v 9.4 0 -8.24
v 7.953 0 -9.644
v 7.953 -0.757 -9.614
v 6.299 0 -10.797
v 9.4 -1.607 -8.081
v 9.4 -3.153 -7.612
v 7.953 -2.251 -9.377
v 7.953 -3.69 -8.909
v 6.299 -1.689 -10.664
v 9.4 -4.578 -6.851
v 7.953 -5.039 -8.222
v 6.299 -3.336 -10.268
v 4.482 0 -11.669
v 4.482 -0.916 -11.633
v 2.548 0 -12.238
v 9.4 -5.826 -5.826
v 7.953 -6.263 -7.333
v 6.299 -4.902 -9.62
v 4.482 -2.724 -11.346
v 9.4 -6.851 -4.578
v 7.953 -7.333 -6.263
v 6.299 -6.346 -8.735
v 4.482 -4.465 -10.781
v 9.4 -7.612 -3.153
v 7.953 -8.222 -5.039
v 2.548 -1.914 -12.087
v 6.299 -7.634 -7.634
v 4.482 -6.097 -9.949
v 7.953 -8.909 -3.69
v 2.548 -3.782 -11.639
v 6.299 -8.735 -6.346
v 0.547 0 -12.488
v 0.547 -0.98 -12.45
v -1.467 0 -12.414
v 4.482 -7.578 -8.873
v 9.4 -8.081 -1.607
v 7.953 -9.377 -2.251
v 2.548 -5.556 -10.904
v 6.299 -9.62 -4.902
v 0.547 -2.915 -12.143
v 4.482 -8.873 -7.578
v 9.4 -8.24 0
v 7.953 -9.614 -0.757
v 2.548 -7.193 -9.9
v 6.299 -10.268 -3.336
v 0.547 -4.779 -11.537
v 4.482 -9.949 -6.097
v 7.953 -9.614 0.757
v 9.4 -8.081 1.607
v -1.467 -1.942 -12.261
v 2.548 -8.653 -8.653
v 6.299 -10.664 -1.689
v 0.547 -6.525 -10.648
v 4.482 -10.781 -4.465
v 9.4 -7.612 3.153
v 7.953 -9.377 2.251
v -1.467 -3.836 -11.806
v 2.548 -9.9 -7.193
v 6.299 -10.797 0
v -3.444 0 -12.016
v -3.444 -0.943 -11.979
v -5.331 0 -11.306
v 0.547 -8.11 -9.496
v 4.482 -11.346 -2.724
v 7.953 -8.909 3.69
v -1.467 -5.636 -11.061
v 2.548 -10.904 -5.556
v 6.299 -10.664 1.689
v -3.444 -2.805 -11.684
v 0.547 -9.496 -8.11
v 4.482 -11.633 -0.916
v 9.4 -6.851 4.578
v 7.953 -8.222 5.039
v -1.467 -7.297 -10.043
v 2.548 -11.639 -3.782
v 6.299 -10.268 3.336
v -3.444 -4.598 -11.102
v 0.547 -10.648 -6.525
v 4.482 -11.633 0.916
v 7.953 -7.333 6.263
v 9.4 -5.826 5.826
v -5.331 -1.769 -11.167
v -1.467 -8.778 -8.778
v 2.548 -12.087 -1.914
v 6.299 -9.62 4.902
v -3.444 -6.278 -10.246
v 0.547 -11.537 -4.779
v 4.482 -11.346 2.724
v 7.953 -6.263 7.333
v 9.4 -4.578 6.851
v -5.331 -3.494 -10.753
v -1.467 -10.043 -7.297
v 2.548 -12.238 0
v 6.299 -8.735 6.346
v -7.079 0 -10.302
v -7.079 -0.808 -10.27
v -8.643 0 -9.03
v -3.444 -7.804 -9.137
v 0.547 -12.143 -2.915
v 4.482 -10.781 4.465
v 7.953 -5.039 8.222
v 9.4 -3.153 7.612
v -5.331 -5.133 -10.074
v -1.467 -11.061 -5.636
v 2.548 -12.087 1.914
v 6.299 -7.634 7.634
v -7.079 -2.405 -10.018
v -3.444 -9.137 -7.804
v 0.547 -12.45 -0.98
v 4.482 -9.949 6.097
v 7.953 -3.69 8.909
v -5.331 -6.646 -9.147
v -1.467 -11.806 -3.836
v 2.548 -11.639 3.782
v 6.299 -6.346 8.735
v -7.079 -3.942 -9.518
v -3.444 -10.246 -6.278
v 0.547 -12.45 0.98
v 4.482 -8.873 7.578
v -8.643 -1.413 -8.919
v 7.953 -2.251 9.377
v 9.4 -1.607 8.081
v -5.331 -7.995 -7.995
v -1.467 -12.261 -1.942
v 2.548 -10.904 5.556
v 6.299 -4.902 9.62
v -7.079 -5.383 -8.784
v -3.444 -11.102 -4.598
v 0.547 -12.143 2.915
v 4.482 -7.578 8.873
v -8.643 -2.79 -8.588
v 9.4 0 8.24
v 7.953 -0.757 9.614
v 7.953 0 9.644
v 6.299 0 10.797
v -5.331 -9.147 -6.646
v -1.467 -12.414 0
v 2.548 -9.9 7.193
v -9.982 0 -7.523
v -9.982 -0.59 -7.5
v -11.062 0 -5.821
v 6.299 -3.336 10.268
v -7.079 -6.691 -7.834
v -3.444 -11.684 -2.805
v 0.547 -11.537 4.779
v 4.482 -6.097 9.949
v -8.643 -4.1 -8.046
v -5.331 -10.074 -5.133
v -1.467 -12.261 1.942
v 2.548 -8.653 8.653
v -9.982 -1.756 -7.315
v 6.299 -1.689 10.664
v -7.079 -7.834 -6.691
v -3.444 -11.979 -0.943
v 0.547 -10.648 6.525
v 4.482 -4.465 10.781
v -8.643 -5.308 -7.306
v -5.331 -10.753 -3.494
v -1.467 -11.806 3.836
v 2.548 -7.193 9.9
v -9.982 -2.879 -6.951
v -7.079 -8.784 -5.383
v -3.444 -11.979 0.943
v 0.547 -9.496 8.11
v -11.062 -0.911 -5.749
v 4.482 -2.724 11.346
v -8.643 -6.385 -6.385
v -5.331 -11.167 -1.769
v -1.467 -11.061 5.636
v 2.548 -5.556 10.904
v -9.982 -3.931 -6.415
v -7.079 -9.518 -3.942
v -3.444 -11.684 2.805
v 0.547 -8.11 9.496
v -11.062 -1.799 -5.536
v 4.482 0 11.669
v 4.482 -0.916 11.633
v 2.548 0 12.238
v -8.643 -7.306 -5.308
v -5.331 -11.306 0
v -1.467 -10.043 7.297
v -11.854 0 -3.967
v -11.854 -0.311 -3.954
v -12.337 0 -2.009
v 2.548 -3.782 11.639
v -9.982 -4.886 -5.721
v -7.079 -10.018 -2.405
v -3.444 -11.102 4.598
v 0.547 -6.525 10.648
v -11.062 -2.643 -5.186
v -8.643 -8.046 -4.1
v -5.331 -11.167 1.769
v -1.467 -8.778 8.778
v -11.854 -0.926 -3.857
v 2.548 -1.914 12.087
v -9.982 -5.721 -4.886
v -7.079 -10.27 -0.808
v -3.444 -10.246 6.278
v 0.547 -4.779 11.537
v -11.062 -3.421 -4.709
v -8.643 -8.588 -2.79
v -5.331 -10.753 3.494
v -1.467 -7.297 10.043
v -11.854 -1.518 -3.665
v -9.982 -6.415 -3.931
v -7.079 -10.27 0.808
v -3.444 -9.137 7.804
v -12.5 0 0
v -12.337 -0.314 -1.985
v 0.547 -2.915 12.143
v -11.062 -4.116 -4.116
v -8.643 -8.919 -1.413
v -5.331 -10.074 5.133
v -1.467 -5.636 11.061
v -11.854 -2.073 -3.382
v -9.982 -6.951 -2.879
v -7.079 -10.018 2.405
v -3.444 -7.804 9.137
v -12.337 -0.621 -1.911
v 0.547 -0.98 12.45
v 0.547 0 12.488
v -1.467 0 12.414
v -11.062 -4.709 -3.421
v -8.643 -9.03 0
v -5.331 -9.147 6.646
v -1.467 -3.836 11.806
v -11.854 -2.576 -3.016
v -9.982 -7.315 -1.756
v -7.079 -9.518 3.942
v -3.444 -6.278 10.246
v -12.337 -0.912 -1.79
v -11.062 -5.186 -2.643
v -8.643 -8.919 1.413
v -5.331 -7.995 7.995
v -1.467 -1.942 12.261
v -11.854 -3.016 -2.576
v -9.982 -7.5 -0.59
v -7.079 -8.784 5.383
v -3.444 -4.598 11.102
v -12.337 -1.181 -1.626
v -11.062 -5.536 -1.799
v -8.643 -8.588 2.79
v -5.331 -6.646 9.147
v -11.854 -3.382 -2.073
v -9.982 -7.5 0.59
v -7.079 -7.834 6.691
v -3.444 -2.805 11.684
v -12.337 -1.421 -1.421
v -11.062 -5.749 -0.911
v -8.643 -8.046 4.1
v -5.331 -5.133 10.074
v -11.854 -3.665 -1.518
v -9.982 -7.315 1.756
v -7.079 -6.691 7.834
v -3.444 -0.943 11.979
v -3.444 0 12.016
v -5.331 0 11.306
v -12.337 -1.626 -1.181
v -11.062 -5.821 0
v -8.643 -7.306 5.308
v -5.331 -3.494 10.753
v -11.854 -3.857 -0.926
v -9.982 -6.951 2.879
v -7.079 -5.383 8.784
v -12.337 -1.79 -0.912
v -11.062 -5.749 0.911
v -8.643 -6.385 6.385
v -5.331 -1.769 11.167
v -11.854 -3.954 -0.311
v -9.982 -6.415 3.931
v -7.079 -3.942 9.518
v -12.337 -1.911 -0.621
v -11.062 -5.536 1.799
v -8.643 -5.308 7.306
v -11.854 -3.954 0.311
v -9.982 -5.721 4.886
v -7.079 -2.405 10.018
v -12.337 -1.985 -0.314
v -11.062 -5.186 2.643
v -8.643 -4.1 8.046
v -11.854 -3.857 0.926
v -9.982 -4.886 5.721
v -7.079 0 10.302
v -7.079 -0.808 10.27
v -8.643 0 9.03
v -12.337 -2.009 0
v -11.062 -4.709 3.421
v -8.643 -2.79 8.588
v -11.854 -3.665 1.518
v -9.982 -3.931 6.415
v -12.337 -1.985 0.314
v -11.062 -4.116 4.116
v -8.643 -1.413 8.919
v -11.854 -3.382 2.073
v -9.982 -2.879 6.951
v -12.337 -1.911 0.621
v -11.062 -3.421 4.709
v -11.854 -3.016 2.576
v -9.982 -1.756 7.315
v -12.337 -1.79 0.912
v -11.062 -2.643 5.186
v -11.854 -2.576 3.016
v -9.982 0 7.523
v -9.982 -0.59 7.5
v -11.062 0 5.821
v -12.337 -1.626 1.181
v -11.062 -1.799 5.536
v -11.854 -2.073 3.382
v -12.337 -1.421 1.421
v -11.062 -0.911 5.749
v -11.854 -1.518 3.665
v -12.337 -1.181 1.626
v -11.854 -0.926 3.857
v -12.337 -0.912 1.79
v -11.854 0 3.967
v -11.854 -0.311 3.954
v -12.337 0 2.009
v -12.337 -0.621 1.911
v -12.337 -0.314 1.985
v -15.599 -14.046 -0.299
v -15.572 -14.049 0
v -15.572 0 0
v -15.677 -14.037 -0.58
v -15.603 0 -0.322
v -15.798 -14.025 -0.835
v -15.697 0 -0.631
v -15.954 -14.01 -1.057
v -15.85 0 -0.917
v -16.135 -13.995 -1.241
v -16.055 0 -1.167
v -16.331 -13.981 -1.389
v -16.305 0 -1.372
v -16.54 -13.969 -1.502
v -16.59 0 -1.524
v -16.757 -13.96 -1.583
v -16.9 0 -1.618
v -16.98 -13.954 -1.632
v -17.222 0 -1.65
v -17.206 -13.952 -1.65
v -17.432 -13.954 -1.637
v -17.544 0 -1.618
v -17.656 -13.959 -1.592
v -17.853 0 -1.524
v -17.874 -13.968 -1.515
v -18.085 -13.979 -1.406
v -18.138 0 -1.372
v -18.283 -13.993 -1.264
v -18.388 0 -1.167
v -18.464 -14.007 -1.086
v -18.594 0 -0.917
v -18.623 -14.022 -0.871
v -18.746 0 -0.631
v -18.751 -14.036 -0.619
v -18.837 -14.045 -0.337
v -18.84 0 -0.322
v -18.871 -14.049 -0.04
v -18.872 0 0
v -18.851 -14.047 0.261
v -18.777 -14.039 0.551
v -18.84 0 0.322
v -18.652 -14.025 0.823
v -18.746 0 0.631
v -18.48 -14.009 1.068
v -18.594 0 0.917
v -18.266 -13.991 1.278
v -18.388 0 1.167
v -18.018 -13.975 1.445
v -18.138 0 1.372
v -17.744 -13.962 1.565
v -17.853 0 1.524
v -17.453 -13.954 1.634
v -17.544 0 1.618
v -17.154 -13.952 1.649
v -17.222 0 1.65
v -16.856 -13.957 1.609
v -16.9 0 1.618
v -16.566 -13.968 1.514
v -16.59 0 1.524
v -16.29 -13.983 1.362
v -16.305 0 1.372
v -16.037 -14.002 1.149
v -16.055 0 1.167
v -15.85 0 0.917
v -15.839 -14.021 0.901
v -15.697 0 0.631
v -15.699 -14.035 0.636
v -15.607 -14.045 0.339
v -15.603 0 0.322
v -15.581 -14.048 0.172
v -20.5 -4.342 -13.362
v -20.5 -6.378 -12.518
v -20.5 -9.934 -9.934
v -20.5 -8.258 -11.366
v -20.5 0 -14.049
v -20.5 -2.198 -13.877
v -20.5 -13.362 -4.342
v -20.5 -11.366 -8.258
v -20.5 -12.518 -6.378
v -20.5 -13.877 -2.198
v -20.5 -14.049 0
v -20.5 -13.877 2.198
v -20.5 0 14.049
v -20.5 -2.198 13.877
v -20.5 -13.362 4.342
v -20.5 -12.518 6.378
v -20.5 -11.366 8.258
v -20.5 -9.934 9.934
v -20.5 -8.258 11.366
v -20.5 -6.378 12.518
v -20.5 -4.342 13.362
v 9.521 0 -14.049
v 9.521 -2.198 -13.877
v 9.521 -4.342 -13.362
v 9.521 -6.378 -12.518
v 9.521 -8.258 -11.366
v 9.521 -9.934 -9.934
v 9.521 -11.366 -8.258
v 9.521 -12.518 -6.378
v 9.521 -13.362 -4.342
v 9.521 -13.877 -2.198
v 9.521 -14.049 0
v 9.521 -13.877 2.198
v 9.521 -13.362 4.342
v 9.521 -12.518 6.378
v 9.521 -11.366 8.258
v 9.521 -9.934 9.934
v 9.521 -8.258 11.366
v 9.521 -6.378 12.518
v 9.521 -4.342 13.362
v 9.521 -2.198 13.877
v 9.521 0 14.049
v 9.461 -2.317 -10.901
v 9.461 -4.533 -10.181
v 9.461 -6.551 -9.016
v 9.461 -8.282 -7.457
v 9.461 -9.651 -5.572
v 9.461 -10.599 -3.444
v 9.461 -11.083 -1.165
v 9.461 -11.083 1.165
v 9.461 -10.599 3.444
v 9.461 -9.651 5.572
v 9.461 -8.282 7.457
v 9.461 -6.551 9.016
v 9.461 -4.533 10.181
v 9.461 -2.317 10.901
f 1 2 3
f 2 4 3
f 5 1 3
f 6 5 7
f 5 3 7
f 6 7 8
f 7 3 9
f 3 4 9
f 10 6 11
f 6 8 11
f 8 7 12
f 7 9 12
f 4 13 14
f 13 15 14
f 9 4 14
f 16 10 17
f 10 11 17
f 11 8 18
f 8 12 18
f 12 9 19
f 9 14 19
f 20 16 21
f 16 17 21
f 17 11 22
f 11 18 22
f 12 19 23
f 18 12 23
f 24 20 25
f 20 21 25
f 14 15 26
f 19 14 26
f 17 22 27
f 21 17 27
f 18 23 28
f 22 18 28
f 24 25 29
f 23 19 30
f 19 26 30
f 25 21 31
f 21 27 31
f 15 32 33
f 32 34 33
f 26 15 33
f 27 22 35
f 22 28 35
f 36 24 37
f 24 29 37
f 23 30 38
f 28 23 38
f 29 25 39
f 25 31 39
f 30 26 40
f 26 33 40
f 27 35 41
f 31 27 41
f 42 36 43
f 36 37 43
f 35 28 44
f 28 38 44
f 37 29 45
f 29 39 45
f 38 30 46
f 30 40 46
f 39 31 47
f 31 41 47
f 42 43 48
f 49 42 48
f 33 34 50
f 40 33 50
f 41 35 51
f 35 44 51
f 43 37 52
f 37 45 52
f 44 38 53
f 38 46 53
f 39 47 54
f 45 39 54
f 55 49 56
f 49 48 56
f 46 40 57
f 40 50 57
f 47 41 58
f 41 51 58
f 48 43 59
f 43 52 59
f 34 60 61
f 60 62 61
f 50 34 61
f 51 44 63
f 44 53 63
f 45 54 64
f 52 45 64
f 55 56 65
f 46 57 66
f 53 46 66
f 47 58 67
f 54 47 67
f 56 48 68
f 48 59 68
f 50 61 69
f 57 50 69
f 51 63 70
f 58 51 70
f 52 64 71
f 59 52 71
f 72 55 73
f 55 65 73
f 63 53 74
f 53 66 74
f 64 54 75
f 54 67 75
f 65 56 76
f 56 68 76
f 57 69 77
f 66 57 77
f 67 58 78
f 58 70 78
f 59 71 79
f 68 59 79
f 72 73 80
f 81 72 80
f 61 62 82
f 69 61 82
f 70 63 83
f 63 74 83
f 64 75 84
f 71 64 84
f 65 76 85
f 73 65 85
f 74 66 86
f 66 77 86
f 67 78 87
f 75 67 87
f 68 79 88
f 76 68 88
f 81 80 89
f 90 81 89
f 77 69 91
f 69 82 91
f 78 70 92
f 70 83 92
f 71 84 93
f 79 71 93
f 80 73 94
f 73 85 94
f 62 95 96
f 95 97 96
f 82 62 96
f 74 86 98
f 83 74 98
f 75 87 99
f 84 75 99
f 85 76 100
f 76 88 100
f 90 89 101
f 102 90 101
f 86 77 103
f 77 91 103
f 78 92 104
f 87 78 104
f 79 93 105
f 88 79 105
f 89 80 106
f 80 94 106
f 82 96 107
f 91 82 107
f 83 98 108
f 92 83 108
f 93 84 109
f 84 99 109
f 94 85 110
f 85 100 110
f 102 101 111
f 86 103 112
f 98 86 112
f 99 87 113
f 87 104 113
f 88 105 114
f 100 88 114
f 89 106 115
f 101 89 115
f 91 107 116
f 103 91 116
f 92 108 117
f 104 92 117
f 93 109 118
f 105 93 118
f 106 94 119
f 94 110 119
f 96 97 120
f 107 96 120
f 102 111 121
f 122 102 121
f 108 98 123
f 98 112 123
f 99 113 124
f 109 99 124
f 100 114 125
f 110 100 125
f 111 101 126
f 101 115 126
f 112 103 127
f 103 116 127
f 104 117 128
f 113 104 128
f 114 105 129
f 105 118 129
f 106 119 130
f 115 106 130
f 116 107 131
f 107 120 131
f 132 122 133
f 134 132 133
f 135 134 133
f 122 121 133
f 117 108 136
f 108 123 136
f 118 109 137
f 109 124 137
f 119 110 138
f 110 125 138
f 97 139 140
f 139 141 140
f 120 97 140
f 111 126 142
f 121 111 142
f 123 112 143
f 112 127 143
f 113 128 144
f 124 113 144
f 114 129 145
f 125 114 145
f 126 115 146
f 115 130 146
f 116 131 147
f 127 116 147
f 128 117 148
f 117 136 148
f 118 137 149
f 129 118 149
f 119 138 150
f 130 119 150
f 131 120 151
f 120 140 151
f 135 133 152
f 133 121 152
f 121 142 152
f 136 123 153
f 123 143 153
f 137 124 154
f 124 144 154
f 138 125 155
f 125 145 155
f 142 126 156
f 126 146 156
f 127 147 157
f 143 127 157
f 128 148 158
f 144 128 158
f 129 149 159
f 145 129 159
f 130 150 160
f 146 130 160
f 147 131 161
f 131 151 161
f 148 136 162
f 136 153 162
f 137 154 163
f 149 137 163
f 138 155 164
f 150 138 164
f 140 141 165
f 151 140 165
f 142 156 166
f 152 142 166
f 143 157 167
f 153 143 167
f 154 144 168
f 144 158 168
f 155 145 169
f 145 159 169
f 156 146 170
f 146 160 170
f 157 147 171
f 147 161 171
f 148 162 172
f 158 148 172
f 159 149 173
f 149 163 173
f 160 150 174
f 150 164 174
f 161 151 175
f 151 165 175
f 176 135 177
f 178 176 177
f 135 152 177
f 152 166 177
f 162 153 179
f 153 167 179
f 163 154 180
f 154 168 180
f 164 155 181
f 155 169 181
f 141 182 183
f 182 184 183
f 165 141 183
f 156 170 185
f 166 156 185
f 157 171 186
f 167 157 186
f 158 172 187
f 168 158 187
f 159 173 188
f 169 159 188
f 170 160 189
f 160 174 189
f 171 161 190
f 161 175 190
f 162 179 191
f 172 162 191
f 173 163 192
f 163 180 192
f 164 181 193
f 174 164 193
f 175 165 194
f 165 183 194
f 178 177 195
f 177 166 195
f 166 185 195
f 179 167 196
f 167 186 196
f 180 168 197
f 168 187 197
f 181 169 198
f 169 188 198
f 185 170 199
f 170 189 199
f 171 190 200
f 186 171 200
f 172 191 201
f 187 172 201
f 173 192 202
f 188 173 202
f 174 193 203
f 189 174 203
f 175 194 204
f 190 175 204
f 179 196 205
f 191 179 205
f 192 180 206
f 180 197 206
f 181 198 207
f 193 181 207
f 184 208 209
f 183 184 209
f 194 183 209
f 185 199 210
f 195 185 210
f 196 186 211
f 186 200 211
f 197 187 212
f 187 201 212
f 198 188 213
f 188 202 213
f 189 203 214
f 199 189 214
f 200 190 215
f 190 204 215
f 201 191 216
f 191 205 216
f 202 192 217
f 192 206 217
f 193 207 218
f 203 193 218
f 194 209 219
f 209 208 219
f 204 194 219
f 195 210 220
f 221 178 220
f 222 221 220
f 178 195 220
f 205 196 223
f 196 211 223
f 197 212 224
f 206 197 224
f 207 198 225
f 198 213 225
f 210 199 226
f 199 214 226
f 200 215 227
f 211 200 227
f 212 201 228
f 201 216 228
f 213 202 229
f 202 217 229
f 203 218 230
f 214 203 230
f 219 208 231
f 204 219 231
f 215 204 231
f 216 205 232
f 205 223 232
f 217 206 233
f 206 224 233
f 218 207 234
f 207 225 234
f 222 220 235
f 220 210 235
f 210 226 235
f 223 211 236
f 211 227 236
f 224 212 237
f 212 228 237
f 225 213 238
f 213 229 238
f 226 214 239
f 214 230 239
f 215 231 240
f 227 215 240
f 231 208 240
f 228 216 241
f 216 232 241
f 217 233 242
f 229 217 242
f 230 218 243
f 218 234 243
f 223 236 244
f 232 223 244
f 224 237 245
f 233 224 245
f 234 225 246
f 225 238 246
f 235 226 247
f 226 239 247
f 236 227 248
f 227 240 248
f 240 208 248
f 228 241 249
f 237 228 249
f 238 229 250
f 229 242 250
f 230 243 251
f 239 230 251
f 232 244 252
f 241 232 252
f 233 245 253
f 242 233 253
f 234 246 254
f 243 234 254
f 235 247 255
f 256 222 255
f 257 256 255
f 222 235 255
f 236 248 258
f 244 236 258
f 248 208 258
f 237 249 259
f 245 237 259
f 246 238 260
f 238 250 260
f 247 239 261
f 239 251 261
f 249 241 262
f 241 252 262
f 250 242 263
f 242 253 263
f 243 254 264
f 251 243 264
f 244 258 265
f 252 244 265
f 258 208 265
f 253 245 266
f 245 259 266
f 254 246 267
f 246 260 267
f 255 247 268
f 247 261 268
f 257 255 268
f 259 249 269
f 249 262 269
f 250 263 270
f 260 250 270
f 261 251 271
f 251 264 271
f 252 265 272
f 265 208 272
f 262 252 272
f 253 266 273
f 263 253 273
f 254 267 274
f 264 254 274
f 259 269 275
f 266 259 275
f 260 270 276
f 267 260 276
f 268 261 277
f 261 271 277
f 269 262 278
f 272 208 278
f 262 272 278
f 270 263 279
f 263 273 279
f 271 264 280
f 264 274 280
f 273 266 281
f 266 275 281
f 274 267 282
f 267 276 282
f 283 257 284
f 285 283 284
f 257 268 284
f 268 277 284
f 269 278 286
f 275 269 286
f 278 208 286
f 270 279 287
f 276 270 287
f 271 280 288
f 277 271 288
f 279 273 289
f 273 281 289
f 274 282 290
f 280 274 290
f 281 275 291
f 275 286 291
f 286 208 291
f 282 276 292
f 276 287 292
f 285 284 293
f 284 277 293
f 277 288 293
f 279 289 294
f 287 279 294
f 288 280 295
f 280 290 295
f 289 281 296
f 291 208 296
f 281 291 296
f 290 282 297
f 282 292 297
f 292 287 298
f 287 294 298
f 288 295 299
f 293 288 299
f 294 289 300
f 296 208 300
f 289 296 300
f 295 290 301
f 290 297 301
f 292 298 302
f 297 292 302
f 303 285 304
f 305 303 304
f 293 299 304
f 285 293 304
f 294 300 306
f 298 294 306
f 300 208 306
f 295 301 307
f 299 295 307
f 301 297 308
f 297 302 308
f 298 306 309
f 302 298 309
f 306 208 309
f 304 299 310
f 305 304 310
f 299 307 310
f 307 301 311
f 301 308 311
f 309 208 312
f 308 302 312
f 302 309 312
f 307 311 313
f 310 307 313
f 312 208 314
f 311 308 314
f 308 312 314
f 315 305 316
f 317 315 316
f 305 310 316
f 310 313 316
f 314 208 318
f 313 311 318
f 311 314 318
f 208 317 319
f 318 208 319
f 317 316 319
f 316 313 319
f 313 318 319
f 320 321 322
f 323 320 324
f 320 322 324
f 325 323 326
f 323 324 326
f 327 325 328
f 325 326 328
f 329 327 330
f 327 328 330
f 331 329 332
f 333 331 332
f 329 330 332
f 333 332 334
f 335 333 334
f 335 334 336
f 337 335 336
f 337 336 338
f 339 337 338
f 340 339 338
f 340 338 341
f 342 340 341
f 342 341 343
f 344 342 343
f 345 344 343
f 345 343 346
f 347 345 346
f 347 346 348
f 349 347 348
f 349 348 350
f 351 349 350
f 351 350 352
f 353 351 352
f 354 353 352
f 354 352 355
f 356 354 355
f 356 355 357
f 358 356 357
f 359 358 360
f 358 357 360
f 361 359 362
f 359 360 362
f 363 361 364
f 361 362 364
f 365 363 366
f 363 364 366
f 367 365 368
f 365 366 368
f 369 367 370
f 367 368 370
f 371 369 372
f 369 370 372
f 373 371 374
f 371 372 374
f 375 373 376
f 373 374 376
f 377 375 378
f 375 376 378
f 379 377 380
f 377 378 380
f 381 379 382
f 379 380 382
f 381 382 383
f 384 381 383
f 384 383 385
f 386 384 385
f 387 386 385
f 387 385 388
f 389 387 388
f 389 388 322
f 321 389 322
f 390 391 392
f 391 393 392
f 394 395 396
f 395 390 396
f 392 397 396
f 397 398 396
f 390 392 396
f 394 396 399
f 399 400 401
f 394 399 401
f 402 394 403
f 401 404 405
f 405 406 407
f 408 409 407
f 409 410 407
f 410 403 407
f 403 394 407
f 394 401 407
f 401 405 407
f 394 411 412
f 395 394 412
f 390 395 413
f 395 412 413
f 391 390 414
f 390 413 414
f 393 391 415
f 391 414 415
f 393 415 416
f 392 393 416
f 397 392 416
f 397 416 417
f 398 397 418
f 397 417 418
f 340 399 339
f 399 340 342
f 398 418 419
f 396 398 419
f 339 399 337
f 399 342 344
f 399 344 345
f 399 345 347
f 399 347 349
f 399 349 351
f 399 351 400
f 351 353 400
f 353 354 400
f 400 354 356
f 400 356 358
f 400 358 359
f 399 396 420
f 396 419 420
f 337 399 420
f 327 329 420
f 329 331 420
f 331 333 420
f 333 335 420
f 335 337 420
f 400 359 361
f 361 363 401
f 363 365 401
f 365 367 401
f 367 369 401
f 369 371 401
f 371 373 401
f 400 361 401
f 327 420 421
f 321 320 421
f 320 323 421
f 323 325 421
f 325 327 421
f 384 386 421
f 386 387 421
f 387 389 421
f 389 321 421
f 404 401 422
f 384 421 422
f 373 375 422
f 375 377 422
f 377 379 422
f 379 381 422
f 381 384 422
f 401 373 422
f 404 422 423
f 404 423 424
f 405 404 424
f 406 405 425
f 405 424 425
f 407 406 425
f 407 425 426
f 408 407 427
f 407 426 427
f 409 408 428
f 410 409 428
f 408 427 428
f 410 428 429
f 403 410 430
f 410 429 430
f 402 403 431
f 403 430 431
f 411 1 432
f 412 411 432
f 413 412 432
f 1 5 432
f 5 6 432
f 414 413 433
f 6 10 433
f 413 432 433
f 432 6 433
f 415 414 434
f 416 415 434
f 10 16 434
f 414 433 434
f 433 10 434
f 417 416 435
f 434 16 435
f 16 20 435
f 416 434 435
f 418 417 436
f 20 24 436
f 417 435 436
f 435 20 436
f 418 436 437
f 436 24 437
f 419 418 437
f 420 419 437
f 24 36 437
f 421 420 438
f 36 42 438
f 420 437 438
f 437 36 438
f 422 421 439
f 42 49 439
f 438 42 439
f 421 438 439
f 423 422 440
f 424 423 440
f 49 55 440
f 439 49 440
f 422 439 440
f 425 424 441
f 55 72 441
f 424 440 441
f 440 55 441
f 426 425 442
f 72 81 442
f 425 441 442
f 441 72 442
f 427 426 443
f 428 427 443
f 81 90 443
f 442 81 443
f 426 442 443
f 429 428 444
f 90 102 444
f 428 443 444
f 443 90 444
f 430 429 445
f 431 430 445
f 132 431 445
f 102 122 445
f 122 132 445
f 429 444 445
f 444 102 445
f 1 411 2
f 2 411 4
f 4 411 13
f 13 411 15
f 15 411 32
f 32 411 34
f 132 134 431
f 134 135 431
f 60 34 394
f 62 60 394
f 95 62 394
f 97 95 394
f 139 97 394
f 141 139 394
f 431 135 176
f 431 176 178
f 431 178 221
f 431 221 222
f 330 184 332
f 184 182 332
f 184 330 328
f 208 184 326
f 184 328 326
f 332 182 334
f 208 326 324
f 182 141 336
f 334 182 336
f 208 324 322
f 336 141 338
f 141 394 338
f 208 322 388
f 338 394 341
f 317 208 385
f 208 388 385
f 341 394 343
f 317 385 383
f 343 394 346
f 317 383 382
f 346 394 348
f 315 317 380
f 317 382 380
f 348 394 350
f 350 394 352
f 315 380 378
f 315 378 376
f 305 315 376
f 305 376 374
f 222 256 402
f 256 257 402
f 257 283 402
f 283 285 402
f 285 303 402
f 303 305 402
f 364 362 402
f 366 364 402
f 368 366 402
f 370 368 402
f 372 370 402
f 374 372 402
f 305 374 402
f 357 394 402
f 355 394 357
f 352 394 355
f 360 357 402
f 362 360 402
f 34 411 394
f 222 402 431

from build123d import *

# Parameters (mm, degrees)
CORTAR_EXTRUIR3_DEPTH = 45
CROQUIS6_R            = 1.65
CORTAR_EXTRUIR4_DEPTH = 20


with BuildPart() as part:
    # Croquis1 → Revolución3 (revolve)
    with BuildSketch(Plane(origin=(0, 0, 0), x_dir=(1, 0, 0), z_dir=(0, 1, 0))):
        with BuildLine():
            Line((-12.5, 0), (-20.5, 0))
            Line((-20.5, 0), (-20.5, 14.049477092))
            Line((-20.5, 14.049477092), (9.52106407, 14.049477092))
            Line((9.52106407, 14.049477092), (9.399951047, 8.239594669))
            ThreePointArc((9.399951047, 8.239594669), (-4.40173897, 11.699345881), (-12.5, 0))
        make_face()
    revolve(axis=Axis((-12.5, 0, 0), (-1, 0, 0)))

    # Croquis5 → Cortar-Extruir3 (cut)
    with BuildSketch(Plane.ZY.offset(20.5)):
        Polygon((0, 0), (-16.832618664, 0), (-16.832618664, 15.474654251), (15.925083383, 15.474654251), (15.925083383, 0), align=None)
    extrude(amount=-CORTAR_EXTRUIR3_DEPTH, mode=Mode.SUBTRACT)

    # Croquis6 → Cortar-Extruir4 (cut)
    with BuildSketch(Plane(origin=(0, 0, 0), x_dir=(1, 0, 0), z_dir=(0, 1, 0))):
        with Locations((-17.221724739, 0)):
            Circle(CROQUIS6_R)
    extrude(amount=-CORTAR_EXTRUIR4_DEPTH, mode=Mode.SUBTRACT)


solid = part.part
